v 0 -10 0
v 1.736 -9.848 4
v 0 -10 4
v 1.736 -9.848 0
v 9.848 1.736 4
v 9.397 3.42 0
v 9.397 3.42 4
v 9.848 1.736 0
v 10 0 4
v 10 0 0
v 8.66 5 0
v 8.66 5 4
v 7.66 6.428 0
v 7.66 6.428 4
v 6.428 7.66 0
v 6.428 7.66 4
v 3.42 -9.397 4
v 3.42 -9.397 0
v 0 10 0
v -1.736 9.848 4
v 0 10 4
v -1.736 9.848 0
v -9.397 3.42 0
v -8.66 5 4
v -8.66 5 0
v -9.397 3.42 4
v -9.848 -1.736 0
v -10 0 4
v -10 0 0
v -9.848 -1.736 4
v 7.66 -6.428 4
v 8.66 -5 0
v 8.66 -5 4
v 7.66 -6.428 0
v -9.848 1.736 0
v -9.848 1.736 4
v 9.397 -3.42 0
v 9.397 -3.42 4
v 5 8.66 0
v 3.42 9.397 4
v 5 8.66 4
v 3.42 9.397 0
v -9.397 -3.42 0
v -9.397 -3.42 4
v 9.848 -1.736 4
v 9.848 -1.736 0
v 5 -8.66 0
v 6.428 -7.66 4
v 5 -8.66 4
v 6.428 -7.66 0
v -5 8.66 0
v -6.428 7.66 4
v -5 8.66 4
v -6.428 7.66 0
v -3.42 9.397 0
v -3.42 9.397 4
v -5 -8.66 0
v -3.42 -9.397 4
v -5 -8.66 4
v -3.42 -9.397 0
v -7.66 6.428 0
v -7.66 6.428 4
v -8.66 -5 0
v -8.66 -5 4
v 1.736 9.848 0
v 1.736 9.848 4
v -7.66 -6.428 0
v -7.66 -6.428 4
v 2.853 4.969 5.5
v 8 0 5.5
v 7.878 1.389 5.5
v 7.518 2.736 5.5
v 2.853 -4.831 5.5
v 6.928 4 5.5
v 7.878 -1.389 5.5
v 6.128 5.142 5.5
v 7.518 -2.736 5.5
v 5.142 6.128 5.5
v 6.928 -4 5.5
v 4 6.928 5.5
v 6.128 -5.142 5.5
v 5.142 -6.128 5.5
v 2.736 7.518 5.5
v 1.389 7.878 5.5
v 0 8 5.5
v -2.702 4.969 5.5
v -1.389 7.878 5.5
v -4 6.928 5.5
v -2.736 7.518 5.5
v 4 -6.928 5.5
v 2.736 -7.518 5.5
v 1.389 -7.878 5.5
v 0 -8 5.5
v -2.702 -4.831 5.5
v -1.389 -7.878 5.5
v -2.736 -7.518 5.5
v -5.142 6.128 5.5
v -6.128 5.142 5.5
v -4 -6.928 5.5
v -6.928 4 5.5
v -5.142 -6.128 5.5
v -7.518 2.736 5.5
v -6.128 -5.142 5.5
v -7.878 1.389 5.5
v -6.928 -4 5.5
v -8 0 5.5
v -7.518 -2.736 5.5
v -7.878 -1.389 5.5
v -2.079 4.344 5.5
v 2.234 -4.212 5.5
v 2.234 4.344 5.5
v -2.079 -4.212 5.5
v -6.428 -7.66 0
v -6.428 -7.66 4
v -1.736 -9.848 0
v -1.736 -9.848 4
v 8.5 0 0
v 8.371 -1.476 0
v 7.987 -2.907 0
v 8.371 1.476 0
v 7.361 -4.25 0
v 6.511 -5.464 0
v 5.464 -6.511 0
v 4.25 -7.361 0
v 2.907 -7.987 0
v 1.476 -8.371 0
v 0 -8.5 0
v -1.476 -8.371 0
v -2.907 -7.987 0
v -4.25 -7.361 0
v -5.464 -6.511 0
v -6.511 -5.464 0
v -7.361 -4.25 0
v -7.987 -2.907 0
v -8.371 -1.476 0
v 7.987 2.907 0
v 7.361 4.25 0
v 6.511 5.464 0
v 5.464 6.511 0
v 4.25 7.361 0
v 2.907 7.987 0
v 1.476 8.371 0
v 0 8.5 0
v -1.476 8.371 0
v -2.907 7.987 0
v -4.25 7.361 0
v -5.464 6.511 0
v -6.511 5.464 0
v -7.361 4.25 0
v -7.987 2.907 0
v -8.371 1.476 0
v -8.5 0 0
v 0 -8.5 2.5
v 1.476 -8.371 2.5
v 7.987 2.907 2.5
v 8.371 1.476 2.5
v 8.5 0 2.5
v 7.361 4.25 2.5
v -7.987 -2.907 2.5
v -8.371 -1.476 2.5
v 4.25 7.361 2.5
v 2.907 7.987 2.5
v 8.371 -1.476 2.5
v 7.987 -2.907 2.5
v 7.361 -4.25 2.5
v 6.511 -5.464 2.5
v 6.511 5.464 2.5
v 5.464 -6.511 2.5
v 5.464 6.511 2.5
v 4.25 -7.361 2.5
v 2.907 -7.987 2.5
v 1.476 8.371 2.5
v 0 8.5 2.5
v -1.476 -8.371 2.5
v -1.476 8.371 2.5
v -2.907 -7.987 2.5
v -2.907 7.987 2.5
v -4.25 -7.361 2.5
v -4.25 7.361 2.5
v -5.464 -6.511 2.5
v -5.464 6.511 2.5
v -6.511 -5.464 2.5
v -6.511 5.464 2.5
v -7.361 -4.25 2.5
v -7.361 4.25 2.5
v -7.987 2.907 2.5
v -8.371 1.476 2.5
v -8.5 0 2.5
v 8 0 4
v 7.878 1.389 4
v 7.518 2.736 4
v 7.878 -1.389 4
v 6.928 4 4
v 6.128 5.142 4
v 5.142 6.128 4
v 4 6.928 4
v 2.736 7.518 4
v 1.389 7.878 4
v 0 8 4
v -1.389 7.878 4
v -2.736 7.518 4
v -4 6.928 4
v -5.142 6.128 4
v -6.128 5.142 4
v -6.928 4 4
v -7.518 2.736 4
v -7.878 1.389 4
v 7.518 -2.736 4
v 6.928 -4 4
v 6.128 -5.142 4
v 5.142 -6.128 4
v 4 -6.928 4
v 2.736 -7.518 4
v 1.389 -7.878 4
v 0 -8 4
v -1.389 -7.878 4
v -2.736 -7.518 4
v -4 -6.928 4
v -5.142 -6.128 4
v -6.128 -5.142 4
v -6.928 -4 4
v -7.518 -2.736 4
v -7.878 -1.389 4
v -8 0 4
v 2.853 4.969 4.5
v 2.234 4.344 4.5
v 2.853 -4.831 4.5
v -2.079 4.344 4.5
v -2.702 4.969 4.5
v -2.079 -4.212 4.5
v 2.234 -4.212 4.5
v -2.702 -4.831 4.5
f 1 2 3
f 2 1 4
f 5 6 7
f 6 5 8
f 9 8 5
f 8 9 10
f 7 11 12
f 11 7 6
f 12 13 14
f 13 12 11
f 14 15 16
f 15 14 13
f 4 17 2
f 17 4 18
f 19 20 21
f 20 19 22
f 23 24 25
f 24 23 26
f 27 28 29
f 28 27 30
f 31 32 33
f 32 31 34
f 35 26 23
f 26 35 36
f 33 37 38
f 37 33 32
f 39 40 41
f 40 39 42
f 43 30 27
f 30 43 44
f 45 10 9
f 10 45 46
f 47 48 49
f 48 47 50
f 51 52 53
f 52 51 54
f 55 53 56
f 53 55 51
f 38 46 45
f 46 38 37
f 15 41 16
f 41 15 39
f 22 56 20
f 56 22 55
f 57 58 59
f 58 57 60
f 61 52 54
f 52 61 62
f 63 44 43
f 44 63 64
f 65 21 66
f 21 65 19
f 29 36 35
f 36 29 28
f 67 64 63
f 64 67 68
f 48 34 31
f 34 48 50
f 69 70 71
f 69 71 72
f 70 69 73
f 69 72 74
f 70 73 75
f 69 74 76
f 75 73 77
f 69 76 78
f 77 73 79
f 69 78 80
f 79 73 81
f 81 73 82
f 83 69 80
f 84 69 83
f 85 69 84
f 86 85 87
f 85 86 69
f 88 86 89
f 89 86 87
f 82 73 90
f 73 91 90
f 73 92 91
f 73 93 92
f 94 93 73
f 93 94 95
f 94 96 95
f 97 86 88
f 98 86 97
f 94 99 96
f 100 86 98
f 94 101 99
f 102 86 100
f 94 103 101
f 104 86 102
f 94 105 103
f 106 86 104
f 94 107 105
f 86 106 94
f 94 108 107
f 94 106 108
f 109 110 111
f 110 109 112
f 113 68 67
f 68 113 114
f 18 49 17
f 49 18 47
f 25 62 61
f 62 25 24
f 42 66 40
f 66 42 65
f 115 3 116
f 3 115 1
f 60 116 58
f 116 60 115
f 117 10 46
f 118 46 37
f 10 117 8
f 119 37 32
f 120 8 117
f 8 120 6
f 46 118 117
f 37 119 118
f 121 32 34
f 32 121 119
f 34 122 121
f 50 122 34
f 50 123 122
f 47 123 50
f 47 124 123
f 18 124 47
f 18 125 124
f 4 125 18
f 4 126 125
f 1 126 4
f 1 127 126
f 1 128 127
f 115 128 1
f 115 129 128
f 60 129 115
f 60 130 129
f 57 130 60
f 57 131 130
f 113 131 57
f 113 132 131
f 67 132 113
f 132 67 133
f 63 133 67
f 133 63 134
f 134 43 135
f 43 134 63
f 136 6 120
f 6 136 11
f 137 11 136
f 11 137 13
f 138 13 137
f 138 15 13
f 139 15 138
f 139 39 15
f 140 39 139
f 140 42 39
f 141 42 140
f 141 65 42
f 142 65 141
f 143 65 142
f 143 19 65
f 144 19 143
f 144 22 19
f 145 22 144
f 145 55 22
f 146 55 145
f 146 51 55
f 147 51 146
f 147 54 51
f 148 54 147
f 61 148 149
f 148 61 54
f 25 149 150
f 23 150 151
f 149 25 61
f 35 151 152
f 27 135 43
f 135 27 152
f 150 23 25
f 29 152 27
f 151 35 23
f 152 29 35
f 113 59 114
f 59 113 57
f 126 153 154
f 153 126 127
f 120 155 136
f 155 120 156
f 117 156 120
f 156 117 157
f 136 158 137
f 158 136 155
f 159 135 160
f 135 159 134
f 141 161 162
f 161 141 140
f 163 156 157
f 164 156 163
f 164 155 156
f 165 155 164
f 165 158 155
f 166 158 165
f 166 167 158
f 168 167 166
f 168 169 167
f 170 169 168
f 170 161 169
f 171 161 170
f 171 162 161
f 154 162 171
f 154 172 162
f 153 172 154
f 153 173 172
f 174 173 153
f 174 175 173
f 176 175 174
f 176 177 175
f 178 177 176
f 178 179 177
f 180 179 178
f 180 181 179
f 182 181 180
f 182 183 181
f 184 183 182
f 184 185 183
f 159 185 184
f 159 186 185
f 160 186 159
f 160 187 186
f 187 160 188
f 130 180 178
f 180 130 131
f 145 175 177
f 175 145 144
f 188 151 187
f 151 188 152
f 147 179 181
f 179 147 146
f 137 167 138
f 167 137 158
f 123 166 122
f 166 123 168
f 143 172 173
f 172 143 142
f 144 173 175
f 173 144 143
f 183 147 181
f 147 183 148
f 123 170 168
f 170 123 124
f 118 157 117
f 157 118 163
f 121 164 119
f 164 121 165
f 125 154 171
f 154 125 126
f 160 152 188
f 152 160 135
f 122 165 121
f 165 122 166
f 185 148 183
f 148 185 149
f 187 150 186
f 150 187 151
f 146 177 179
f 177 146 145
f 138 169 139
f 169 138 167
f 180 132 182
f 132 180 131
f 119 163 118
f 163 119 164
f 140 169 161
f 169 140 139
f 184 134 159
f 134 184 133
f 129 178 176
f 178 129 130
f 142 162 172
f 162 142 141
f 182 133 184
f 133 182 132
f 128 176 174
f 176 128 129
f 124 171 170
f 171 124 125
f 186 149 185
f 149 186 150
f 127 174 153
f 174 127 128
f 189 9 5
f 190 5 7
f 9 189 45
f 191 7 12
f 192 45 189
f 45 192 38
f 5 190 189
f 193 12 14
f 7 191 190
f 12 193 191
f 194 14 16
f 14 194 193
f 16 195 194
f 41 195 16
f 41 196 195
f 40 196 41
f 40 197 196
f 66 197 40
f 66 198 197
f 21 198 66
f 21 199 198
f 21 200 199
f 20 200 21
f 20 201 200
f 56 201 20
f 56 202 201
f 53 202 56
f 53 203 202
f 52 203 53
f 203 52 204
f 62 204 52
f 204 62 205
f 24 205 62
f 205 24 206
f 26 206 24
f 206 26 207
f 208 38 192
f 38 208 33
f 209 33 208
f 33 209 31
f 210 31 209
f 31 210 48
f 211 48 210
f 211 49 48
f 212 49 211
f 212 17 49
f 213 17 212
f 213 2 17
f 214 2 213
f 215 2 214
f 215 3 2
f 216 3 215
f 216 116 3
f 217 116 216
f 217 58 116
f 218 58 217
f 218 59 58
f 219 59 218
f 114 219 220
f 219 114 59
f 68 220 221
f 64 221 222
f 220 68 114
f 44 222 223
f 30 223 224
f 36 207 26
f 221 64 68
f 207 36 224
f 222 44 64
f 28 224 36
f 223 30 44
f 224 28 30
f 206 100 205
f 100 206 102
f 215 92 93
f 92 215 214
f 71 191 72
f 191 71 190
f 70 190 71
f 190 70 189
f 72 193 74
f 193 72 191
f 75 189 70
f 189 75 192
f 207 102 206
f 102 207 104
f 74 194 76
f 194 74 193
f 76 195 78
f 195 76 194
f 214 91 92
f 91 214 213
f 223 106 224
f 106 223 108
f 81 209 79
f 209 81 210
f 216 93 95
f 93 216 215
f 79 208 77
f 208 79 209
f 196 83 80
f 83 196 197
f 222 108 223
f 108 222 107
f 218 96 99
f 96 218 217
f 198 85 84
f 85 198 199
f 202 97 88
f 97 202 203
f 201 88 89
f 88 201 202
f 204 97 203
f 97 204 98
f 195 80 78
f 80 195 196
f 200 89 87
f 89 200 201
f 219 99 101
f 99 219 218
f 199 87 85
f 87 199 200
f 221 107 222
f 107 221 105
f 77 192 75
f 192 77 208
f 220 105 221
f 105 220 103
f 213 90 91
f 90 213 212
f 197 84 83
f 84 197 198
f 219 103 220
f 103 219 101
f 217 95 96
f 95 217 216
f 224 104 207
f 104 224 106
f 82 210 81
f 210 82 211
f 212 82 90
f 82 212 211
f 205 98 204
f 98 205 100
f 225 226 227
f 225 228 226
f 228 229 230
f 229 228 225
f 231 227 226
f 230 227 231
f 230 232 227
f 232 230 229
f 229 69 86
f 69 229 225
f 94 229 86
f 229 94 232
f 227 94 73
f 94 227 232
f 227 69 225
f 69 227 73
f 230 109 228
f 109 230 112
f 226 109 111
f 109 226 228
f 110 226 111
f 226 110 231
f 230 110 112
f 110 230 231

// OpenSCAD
difference() {
	difference() {
		difference() {
			cylinder($fn = 36, h = 5.5000000000, r = 10);
			translate(v = [0, 0, -1]) {
				cylinder($fn = 36, h = 3.5000000000, r = 8.5000000000);
			}
		}
		translate(v = [0, 0, 4]) {
			difference() {
				cylinder($fn = 36, h = 3, r = 10.5000000000);
				cylinder($fn = 36, h = 3, r = 8);
			}
		}
	}
	translate(v = [0, 0, 4.5000000000]) {
		linear_extrude(height = 3) {
			text(font = "mana", halign = "center", size = 8, text = "\uE600", valign = "center");
		}
	}
}
